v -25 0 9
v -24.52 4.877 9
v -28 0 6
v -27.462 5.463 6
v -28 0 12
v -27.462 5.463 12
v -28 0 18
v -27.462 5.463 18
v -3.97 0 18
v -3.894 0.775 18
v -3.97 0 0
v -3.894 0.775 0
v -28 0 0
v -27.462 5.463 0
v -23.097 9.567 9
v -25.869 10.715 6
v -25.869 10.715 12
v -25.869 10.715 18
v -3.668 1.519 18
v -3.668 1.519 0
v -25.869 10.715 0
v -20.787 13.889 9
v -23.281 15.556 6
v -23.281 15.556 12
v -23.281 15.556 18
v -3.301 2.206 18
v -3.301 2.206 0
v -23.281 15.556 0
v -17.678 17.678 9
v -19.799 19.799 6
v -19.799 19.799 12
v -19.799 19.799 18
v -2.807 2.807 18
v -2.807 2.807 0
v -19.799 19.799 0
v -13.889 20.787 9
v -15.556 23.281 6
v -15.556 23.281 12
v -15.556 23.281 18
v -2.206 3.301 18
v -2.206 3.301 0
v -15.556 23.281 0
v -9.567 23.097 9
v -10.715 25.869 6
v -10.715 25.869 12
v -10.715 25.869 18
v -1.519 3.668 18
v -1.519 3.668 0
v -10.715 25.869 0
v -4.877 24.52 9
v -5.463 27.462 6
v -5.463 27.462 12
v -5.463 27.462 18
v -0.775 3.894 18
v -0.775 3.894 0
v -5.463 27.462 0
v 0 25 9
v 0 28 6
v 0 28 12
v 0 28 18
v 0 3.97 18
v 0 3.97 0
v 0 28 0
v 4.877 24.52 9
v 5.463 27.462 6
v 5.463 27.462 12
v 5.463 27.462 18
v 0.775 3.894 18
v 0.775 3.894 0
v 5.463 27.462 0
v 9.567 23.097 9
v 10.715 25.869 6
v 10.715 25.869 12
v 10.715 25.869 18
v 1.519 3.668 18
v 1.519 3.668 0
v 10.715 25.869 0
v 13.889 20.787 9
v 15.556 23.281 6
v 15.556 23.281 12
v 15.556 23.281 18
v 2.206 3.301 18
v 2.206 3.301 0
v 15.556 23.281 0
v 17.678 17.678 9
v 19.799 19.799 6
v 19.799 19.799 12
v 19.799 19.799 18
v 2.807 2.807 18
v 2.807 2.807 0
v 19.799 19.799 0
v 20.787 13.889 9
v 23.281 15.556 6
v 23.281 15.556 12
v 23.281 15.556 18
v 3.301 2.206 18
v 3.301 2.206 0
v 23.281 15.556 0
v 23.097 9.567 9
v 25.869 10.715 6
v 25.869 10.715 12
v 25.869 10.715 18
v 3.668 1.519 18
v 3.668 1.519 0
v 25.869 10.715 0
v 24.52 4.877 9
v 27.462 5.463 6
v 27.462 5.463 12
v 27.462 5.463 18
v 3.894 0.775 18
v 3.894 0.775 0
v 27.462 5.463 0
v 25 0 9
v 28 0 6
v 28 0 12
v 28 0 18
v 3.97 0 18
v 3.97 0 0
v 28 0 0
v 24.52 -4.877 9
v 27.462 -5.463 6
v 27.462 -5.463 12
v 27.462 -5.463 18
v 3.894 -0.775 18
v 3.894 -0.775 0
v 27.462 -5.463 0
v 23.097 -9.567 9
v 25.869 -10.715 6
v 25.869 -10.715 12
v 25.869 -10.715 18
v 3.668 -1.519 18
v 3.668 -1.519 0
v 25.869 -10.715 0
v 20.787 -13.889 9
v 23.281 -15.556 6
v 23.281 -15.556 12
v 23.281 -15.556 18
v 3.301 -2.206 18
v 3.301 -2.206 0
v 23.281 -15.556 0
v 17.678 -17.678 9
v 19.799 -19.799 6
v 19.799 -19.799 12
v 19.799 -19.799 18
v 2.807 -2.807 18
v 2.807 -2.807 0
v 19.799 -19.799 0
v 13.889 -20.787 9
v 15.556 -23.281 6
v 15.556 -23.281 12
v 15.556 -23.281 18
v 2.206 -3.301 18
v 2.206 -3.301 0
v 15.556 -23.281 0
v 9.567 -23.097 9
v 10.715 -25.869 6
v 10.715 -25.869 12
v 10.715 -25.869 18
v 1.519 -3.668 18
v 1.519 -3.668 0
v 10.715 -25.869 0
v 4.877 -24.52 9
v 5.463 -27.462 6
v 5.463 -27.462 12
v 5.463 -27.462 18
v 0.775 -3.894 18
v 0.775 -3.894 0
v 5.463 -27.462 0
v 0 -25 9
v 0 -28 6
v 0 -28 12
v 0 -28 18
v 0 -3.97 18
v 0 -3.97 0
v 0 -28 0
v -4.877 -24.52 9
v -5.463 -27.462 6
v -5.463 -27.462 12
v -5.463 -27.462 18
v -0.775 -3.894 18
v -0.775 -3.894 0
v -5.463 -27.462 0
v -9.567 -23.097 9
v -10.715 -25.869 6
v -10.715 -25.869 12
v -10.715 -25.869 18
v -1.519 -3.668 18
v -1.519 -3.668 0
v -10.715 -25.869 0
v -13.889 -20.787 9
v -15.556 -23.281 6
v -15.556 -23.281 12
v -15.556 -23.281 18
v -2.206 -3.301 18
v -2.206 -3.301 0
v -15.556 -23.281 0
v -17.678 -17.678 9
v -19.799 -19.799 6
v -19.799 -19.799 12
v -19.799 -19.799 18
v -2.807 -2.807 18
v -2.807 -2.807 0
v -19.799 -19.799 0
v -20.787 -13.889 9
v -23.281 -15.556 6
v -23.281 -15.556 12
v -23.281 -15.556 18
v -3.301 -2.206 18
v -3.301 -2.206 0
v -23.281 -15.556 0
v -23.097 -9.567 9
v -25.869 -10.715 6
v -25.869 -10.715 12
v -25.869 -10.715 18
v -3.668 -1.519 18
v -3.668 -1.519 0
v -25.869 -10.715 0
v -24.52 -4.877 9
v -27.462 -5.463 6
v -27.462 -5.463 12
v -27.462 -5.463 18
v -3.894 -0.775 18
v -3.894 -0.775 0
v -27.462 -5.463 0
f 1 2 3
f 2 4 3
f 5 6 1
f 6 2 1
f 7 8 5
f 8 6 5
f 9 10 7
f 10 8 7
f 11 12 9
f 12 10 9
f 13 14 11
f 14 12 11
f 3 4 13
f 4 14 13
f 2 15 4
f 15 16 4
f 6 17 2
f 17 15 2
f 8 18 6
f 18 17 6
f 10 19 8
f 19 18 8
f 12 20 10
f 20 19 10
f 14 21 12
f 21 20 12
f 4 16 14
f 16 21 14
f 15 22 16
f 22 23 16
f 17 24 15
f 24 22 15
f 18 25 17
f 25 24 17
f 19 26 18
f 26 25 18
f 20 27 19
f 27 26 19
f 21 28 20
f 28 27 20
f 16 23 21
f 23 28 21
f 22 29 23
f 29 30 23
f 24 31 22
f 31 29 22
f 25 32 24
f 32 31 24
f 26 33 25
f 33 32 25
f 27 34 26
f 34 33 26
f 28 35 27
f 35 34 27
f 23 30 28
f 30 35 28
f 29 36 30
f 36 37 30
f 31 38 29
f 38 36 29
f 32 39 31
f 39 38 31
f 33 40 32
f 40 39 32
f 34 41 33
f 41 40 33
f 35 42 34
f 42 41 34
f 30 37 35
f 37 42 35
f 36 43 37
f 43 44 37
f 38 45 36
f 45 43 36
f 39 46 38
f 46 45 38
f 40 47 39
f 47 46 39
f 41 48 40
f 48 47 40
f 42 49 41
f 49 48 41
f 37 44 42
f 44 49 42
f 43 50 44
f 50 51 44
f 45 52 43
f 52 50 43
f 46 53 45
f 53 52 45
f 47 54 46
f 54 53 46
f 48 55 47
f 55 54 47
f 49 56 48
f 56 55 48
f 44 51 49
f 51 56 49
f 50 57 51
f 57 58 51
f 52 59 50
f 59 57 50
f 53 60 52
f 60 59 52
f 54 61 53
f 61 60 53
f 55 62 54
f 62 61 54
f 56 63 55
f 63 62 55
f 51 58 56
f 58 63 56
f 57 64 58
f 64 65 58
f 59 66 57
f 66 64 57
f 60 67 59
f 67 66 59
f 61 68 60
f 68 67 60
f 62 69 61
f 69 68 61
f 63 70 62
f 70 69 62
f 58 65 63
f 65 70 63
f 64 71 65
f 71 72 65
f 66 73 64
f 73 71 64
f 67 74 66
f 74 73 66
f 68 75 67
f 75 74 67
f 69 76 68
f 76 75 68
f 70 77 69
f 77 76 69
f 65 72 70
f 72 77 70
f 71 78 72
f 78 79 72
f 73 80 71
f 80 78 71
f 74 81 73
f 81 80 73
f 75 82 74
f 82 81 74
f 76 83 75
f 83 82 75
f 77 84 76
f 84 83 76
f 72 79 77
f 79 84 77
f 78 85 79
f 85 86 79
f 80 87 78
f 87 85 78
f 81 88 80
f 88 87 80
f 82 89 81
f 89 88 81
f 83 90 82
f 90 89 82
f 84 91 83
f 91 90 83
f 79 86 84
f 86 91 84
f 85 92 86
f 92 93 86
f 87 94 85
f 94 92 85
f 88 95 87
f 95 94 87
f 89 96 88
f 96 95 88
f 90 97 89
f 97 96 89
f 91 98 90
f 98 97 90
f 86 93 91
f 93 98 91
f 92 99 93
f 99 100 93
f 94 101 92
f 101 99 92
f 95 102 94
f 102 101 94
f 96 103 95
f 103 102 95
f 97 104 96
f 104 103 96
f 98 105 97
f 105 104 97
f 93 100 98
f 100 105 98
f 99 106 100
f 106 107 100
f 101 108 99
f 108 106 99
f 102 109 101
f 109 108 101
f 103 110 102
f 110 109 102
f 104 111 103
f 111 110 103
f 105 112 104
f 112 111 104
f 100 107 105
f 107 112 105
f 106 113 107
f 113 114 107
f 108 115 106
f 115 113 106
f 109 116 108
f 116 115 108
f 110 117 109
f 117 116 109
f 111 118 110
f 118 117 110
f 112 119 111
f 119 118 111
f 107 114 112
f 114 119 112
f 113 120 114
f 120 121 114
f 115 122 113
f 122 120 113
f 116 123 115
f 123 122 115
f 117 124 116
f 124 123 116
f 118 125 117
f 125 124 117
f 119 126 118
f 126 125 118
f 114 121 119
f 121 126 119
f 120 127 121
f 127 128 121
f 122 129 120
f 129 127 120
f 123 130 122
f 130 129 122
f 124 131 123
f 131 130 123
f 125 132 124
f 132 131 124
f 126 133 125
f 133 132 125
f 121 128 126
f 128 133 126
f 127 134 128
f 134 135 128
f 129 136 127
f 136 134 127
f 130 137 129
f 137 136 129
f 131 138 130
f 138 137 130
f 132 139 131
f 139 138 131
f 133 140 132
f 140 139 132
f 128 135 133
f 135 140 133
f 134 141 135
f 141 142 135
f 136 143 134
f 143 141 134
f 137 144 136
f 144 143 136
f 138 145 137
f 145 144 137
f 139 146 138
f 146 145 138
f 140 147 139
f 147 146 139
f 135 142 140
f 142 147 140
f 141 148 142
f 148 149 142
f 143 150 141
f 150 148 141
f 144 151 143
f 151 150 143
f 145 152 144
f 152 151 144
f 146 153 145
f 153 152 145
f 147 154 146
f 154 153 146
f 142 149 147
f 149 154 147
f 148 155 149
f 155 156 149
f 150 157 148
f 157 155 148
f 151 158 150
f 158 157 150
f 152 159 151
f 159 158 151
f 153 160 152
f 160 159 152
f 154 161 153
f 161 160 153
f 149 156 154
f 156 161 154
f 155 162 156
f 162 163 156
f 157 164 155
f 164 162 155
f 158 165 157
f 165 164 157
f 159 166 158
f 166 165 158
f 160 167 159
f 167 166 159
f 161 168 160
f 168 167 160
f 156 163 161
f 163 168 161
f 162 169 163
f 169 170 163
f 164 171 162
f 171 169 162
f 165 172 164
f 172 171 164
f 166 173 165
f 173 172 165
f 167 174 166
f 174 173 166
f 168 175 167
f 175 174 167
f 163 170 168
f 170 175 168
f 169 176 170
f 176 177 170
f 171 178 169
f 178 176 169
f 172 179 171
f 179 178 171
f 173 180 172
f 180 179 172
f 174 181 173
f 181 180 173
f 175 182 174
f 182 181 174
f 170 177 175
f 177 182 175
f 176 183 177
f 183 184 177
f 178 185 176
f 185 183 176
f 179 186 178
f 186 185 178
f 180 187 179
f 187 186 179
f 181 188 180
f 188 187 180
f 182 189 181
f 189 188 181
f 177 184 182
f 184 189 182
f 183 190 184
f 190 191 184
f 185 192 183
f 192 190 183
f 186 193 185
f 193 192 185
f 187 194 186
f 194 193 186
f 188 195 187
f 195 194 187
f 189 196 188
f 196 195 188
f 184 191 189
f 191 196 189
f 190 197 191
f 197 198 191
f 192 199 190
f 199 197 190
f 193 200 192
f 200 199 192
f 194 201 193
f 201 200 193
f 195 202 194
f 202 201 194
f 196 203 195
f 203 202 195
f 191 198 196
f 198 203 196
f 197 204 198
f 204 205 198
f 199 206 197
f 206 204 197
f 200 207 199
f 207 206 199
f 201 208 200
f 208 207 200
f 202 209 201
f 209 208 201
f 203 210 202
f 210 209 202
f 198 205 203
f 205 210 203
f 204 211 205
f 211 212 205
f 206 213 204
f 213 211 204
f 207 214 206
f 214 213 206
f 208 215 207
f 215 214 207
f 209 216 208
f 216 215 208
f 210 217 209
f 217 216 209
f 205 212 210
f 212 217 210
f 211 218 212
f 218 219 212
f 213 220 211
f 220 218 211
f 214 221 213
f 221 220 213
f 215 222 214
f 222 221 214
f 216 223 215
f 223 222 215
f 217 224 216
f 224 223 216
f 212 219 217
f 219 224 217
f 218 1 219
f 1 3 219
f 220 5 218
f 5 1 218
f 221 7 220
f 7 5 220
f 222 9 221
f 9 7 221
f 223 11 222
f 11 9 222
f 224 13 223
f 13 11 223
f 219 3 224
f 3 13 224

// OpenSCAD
$fn = 32;

// ----------------------------------------------------------------------
// Belt roller: 56 mm barrel, 18 mm wide, bore 7.94 mm
// ----------------------------------------------------------------------

// --- parameters (mm) ---
bore_d = 7.94;            // bore
barrel_d = 56;            // barrel diameter
roller_w = 18;            // roller width
groove_w = 6;             // guide groove width
groove_d = 3;             // guide groove depth

roller_profile = [[3.97, 0], [28, 0], [28, 6], [25, 9], [28, 12], [28, 18], [3.97, 18]];

/* the profile stays clear of the axis, so the bore comes out of the revolve */
rotate_extrude() polygon(roller_profile);
